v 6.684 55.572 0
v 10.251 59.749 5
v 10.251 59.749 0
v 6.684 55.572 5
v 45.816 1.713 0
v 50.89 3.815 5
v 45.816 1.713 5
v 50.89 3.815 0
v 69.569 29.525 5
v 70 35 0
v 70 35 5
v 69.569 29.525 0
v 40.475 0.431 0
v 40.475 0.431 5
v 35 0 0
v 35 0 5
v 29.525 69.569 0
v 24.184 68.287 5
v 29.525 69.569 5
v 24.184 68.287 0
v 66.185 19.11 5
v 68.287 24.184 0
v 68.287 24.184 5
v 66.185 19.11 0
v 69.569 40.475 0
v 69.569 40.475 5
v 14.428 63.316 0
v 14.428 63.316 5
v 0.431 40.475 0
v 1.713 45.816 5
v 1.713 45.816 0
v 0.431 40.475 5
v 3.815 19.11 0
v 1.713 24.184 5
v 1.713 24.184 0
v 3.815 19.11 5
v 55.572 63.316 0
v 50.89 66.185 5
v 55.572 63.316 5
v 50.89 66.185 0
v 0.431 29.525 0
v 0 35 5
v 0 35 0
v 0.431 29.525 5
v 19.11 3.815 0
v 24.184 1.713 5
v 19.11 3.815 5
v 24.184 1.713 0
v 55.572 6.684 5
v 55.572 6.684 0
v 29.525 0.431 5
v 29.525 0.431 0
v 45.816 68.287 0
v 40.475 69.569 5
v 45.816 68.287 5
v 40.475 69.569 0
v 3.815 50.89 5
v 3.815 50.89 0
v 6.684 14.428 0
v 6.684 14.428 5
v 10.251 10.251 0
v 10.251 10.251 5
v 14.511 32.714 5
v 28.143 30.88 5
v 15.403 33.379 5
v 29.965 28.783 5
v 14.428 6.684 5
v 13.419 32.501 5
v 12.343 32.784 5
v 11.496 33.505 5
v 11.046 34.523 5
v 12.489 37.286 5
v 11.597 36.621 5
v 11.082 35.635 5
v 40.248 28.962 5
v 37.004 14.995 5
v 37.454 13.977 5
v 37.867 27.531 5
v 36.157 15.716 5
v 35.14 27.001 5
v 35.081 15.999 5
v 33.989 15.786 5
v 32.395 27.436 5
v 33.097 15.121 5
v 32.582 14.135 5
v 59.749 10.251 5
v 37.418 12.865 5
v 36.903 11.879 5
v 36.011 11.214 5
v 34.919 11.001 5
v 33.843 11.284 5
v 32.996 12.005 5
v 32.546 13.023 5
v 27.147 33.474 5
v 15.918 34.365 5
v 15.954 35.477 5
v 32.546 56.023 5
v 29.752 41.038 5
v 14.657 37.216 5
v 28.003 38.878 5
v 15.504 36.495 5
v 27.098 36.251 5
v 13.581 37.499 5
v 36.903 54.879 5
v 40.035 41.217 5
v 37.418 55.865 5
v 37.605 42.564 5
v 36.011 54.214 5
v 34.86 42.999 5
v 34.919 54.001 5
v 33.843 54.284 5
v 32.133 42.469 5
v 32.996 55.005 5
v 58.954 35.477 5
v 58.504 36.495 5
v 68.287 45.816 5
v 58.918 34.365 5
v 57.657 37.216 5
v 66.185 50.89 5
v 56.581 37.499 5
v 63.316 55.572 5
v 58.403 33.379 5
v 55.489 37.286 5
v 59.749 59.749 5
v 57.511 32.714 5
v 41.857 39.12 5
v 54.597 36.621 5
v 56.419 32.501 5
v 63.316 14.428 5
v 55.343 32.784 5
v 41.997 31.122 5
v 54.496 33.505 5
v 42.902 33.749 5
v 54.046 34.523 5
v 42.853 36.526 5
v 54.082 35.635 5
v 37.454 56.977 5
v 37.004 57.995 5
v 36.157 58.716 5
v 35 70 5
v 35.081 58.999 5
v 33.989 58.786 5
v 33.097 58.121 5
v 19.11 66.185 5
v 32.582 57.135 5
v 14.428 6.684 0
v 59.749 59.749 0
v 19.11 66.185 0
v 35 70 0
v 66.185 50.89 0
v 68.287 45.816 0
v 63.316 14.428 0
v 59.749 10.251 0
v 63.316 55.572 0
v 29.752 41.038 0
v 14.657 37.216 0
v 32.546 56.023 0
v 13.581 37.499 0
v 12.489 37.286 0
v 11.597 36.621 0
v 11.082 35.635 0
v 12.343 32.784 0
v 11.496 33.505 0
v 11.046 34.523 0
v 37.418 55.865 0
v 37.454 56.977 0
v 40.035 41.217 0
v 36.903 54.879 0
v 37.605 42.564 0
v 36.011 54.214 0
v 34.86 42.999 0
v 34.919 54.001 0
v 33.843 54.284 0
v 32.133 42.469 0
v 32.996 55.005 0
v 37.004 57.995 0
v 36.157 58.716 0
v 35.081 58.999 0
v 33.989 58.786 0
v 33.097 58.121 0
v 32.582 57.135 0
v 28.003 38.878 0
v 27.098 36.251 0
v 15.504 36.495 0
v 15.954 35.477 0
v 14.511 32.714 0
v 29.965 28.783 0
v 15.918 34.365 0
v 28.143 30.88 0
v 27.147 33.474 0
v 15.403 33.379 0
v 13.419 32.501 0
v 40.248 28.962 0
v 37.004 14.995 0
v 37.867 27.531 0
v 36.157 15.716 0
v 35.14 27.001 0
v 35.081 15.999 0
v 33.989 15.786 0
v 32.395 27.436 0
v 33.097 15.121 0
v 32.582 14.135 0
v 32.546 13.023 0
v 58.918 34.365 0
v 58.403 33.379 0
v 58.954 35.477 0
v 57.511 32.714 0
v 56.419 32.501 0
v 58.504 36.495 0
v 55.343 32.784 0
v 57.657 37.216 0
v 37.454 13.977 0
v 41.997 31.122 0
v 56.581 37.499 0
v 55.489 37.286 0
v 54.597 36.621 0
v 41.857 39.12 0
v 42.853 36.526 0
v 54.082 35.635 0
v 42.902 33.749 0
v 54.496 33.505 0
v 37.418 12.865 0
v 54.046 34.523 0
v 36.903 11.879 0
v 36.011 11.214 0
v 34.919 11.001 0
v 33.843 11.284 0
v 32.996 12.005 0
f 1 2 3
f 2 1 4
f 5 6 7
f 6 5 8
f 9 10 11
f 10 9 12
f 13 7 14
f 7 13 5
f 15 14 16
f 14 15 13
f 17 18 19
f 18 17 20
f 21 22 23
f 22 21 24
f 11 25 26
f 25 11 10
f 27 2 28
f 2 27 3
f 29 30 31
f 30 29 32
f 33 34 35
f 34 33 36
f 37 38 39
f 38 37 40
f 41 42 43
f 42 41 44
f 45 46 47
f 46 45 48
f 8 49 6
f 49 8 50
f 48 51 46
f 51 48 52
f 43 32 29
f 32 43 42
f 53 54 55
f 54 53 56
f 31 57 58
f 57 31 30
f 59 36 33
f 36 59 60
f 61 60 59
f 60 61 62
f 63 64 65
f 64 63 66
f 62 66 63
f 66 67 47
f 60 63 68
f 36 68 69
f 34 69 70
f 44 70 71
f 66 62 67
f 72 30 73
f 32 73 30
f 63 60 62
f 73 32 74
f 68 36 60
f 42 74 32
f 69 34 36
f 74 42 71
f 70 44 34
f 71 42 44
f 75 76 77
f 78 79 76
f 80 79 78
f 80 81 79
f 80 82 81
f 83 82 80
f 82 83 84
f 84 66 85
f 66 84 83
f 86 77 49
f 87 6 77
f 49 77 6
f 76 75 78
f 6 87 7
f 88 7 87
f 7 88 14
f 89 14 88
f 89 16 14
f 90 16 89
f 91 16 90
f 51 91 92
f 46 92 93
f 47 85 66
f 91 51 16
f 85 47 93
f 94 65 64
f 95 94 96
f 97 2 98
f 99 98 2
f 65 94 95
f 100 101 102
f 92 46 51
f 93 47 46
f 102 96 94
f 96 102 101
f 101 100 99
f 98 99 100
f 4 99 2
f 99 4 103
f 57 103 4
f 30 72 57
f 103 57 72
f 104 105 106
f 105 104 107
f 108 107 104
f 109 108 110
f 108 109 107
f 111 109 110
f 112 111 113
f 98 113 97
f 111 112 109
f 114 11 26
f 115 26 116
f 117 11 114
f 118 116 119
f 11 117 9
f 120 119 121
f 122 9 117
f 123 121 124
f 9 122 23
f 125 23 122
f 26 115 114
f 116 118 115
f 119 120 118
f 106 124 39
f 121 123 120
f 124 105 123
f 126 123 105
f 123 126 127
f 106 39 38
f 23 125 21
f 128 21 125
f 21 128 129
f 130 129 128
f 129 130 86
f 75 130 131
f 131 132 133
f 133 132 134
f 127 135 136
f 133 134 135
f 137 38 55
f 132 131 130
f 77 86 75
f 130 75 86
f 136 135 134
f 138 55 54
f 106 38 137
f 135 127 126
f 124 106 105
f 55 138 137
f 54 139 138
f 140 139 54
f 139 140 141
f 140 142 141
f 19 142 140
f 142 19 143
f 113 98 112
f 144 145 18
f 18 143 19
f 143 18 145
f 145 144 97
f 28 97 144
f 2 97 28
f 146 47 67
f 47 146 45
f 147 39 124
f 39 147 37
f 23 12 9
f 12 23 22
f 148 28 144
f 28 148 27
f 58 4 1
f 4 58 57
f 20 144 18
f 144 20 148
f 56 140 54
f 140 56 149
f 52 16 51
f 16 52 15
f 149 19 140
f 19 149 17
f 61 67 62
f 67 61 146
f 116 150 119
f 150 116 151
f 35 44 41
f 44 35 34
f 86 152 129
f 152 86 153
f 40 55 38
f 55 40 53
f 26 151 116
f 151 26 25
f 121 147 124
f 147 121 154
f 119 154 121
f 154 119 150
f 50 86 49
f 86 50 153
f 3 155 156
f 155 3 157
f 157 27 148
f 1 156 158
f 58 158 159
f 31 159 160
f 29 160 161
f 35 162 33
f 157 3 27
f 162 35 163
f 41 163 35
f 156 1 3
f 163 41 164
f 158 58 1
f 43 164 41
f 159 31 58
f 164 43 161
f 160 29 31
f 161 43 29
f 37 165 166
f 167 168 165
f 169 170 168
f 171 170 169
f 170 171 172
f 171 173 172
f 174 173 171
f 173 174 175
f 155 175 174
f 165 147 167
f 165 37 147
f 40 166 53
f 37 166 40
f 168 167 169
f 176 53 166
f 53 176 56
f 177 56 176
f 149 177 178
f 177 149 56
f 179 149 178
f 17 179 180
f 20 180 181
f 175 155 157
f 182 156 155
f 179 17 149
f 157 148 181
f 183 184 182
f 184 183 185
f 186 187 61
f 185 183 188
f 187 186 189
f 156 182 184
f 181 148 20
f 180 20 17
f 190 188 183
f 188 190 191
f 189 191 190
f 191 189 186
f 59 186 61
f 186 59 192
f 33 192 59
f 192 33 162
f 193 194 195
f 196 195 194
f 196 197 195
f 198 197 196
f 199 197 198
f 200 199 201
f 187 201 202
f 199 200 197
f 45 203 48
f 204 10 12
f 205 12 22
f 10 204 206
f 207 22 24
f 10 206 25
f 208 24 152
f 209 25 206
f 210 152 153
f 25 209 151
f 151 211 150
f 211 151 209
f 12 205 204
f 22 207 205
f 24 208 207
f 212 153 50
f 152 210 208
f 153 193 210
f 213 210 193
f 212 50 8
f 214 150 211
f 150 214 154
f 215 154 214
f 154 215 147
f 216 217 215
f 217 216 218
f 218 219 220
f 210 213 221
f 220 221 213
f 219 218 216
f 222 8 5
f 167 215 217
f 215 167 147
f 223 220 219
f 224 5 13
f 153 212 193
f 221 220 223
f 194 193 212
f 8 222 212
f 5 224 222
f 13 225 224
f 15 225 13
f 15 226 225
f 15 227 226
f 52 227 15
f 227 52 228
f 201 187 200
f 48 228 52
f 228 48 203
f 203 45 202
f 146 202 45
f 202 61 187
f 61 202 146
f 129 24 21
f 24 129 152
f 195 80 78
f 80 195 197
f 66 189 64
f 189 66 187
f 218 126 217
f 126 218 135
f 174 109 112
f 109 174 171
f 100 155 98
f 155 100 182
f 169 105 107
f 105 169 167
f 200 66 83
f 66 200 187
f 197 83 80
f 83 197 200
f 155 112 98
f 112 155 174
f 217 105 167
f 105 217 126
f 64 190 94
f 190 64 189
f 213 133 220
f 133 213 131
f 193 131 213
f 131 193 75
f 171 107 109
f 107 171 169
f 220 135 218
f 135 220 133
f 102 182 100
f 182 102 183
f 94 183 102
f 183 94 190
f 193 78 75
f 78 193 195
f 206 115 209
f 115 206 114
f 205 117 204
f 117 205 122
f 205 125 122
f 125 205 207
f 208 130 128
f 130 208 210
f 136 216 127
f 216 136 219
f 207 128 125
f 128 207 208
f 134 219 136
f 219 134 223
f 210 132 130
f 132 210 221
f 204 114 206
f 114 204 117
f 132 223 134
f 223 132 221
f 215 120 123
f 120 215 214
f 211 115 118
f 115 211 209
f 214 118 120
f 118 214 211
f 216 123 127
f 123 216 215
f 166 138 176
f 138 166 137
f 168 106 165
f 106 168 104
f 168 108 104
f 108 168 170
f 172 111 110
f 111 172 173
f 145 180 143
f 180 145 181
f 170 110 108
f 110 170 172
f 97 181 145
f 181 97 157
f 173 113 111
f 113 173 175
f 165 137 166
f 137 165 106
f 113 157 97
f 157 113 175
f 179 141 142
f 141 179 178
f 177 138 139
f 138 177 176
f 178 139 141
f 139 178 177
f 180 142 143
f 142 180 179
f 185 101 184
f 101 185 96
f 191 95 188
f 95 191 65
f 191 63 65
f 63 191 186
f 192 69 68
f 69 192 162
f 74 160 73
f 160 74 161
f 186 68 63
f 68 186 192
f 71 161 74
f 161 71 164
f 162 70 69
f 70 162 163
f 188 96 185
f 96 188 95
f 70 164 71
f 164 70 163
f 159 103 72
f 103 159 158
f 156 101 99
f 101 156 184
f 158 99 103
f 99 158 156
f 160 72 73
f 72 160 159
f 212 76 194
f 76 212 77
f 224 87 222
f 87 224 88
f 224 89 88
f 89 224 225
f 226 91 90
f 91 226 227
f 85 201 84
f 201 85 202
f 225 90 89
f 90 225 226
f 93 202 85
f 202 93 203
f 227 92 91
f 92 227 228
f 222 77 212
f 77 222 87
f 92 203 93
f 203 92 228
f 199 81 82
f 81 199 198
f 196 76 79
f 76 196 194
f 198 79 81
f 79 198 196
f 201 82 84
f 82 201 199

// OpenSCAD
$fn = 32;

// ----------------------------------------------------------------------
// Spacer plate: round flange R35, 4 bolts
// ----------------------------------------------------------------------

// --- parameters (mm) ---
bore_r = 8;               // centre bore radius
bolt_r = 2.5;             // bolt hole radius
plate_t = 5;              // plate thickness, Z (extrusion height)
flange_r = 35;            // flange radius
n_bolt = 4;               // bolt hole count
ring_r = 21.5;            // bolt circle radius

profile = [[70, 35], [69.569, 40.475], [68.287, 45.816], [66.185, 50.89], [63.316, 55.572], [59.749, 59.749], [55.572, 63.316], [50.89, 66.185], [45.816, 68.287], [40.475, 69.569], [35, 70], [29.525, 69.569], [24.184, 68.287], [19.11, 66.185], [14.428, 63.316], [10.251, 59.749], [6.684, 55.572], [3.815, 50.89], [1.713, 45.816], [0.431, 40.475], [0, 35], [0.431, 29.525], [1.713, 24.184], [3.815, 19.11], [6.684, 14.428], [10.251, 10.251], [14.428, 6.684], [19.11, 3.815], [24.184, 1.713], [29.525, 0.431], [35, 0], [40.475, 0.431], [45.816, 1.713], [50.89, 3.815], [55.572, 6.684], [59.749, 10.251], [63.316, 14.428], [66.185, 19.11], [68.287, 24.184], [69.569, 29.525]];  // primary outline, 40 points, counter clockwise
void_1 = [[42.853, 36.526], [41.857, 39.12], [40.035, 41.217], [37.605, 42.564], [34.86, 42.999], [32.133, 42.469], [29.752, 41.038], [28.003, 38.878], [27.098, 36.251], [27.147, 33.474], [28.143, 30.88], [29.965, 28.783], [32.395, 27.436], [35.14, 27.001], [37.867, 27.531], [40.248, 28.962], [41.997, 31.122], [42.902, 33.749]];  // centre bore, 18 points
void_2 = [[58.954, 35.477], [58.504, 36.495], [57.657, 37.216], [56.581, 37.499], [55.489, 37.286], [54.597, 36.621], [54.082, 35.635], [54.046, 34.523], [54.496, 33.505], [55.343, 32.784], [56.419, 32.501], [57.511, 32.714], [58.403, 33.379], [58.918, 34.365]];  // bolt hole 1, 14 points
void_3 = [[37.454, 56.977], [37.004, 57.995], [36.157, 58.716], [35.081, 58.999], [33.989, 58.786], [33.097, 58.121], [32.582, 57.135], [32.546, 56.023], [32.996, 55.005], [33.843, 54.284], [34.919, 54.001], [36.011, 54.214], [36.903, 54.879], [37.418, 55.865]];  // bolt hole 2, 14 points
void_4 = [[15.954, 35.477], [15.504, 36.495], [14.657, 37.216], [13.581, 37.499], [12.489, 37.286], [11.597, 36.621], [11.082, 35.635], [11.046, 34.523], [11.496, 33.505], [12.343, 32.784], [13.419, 32.501], [14.511, 32.714], [15.403, 33.379], [15.918, 34.365]];  // bolt hole 3, 14 points
void_5 = [[37.454, 13.977], [37.004, 14.995], [36.157, 15.716], [35.081, 15.999], [33.989, 15.786], [33.097, 15.121], [32.582, 14.135], [32.546, 13.023], [32.996, 12.005], [33.843, 11.284], [34.919, 11.001], [36.011, 11.214], [36.903, 11.879], [37.418, 12.865]];  // bolt hole 4, 14 points

// --- the one profile operation ---
difference() {
  linear_extrude(height = plate_t) polygon(points = profile);
  translate([0, 0, -1])
    linear_extrude(height = plate_t + 2) polygon(points = void_1);
  translate([0, 0, -1])
    linear_extrude(height = plate_t + 2) polygon(points = void_2);
  translate([0, 0, -1])
    linear_extrude(height = plate_t + 2) polygon(points = void_3);
  translate([0, 0, -1])
    linear_extrude(height = plate_t + 2) polygon(points = void_4);
  translate([0, 0, -1])
    linear_extrude(height = plate_t + 2) polygon(points = void_5);
}
